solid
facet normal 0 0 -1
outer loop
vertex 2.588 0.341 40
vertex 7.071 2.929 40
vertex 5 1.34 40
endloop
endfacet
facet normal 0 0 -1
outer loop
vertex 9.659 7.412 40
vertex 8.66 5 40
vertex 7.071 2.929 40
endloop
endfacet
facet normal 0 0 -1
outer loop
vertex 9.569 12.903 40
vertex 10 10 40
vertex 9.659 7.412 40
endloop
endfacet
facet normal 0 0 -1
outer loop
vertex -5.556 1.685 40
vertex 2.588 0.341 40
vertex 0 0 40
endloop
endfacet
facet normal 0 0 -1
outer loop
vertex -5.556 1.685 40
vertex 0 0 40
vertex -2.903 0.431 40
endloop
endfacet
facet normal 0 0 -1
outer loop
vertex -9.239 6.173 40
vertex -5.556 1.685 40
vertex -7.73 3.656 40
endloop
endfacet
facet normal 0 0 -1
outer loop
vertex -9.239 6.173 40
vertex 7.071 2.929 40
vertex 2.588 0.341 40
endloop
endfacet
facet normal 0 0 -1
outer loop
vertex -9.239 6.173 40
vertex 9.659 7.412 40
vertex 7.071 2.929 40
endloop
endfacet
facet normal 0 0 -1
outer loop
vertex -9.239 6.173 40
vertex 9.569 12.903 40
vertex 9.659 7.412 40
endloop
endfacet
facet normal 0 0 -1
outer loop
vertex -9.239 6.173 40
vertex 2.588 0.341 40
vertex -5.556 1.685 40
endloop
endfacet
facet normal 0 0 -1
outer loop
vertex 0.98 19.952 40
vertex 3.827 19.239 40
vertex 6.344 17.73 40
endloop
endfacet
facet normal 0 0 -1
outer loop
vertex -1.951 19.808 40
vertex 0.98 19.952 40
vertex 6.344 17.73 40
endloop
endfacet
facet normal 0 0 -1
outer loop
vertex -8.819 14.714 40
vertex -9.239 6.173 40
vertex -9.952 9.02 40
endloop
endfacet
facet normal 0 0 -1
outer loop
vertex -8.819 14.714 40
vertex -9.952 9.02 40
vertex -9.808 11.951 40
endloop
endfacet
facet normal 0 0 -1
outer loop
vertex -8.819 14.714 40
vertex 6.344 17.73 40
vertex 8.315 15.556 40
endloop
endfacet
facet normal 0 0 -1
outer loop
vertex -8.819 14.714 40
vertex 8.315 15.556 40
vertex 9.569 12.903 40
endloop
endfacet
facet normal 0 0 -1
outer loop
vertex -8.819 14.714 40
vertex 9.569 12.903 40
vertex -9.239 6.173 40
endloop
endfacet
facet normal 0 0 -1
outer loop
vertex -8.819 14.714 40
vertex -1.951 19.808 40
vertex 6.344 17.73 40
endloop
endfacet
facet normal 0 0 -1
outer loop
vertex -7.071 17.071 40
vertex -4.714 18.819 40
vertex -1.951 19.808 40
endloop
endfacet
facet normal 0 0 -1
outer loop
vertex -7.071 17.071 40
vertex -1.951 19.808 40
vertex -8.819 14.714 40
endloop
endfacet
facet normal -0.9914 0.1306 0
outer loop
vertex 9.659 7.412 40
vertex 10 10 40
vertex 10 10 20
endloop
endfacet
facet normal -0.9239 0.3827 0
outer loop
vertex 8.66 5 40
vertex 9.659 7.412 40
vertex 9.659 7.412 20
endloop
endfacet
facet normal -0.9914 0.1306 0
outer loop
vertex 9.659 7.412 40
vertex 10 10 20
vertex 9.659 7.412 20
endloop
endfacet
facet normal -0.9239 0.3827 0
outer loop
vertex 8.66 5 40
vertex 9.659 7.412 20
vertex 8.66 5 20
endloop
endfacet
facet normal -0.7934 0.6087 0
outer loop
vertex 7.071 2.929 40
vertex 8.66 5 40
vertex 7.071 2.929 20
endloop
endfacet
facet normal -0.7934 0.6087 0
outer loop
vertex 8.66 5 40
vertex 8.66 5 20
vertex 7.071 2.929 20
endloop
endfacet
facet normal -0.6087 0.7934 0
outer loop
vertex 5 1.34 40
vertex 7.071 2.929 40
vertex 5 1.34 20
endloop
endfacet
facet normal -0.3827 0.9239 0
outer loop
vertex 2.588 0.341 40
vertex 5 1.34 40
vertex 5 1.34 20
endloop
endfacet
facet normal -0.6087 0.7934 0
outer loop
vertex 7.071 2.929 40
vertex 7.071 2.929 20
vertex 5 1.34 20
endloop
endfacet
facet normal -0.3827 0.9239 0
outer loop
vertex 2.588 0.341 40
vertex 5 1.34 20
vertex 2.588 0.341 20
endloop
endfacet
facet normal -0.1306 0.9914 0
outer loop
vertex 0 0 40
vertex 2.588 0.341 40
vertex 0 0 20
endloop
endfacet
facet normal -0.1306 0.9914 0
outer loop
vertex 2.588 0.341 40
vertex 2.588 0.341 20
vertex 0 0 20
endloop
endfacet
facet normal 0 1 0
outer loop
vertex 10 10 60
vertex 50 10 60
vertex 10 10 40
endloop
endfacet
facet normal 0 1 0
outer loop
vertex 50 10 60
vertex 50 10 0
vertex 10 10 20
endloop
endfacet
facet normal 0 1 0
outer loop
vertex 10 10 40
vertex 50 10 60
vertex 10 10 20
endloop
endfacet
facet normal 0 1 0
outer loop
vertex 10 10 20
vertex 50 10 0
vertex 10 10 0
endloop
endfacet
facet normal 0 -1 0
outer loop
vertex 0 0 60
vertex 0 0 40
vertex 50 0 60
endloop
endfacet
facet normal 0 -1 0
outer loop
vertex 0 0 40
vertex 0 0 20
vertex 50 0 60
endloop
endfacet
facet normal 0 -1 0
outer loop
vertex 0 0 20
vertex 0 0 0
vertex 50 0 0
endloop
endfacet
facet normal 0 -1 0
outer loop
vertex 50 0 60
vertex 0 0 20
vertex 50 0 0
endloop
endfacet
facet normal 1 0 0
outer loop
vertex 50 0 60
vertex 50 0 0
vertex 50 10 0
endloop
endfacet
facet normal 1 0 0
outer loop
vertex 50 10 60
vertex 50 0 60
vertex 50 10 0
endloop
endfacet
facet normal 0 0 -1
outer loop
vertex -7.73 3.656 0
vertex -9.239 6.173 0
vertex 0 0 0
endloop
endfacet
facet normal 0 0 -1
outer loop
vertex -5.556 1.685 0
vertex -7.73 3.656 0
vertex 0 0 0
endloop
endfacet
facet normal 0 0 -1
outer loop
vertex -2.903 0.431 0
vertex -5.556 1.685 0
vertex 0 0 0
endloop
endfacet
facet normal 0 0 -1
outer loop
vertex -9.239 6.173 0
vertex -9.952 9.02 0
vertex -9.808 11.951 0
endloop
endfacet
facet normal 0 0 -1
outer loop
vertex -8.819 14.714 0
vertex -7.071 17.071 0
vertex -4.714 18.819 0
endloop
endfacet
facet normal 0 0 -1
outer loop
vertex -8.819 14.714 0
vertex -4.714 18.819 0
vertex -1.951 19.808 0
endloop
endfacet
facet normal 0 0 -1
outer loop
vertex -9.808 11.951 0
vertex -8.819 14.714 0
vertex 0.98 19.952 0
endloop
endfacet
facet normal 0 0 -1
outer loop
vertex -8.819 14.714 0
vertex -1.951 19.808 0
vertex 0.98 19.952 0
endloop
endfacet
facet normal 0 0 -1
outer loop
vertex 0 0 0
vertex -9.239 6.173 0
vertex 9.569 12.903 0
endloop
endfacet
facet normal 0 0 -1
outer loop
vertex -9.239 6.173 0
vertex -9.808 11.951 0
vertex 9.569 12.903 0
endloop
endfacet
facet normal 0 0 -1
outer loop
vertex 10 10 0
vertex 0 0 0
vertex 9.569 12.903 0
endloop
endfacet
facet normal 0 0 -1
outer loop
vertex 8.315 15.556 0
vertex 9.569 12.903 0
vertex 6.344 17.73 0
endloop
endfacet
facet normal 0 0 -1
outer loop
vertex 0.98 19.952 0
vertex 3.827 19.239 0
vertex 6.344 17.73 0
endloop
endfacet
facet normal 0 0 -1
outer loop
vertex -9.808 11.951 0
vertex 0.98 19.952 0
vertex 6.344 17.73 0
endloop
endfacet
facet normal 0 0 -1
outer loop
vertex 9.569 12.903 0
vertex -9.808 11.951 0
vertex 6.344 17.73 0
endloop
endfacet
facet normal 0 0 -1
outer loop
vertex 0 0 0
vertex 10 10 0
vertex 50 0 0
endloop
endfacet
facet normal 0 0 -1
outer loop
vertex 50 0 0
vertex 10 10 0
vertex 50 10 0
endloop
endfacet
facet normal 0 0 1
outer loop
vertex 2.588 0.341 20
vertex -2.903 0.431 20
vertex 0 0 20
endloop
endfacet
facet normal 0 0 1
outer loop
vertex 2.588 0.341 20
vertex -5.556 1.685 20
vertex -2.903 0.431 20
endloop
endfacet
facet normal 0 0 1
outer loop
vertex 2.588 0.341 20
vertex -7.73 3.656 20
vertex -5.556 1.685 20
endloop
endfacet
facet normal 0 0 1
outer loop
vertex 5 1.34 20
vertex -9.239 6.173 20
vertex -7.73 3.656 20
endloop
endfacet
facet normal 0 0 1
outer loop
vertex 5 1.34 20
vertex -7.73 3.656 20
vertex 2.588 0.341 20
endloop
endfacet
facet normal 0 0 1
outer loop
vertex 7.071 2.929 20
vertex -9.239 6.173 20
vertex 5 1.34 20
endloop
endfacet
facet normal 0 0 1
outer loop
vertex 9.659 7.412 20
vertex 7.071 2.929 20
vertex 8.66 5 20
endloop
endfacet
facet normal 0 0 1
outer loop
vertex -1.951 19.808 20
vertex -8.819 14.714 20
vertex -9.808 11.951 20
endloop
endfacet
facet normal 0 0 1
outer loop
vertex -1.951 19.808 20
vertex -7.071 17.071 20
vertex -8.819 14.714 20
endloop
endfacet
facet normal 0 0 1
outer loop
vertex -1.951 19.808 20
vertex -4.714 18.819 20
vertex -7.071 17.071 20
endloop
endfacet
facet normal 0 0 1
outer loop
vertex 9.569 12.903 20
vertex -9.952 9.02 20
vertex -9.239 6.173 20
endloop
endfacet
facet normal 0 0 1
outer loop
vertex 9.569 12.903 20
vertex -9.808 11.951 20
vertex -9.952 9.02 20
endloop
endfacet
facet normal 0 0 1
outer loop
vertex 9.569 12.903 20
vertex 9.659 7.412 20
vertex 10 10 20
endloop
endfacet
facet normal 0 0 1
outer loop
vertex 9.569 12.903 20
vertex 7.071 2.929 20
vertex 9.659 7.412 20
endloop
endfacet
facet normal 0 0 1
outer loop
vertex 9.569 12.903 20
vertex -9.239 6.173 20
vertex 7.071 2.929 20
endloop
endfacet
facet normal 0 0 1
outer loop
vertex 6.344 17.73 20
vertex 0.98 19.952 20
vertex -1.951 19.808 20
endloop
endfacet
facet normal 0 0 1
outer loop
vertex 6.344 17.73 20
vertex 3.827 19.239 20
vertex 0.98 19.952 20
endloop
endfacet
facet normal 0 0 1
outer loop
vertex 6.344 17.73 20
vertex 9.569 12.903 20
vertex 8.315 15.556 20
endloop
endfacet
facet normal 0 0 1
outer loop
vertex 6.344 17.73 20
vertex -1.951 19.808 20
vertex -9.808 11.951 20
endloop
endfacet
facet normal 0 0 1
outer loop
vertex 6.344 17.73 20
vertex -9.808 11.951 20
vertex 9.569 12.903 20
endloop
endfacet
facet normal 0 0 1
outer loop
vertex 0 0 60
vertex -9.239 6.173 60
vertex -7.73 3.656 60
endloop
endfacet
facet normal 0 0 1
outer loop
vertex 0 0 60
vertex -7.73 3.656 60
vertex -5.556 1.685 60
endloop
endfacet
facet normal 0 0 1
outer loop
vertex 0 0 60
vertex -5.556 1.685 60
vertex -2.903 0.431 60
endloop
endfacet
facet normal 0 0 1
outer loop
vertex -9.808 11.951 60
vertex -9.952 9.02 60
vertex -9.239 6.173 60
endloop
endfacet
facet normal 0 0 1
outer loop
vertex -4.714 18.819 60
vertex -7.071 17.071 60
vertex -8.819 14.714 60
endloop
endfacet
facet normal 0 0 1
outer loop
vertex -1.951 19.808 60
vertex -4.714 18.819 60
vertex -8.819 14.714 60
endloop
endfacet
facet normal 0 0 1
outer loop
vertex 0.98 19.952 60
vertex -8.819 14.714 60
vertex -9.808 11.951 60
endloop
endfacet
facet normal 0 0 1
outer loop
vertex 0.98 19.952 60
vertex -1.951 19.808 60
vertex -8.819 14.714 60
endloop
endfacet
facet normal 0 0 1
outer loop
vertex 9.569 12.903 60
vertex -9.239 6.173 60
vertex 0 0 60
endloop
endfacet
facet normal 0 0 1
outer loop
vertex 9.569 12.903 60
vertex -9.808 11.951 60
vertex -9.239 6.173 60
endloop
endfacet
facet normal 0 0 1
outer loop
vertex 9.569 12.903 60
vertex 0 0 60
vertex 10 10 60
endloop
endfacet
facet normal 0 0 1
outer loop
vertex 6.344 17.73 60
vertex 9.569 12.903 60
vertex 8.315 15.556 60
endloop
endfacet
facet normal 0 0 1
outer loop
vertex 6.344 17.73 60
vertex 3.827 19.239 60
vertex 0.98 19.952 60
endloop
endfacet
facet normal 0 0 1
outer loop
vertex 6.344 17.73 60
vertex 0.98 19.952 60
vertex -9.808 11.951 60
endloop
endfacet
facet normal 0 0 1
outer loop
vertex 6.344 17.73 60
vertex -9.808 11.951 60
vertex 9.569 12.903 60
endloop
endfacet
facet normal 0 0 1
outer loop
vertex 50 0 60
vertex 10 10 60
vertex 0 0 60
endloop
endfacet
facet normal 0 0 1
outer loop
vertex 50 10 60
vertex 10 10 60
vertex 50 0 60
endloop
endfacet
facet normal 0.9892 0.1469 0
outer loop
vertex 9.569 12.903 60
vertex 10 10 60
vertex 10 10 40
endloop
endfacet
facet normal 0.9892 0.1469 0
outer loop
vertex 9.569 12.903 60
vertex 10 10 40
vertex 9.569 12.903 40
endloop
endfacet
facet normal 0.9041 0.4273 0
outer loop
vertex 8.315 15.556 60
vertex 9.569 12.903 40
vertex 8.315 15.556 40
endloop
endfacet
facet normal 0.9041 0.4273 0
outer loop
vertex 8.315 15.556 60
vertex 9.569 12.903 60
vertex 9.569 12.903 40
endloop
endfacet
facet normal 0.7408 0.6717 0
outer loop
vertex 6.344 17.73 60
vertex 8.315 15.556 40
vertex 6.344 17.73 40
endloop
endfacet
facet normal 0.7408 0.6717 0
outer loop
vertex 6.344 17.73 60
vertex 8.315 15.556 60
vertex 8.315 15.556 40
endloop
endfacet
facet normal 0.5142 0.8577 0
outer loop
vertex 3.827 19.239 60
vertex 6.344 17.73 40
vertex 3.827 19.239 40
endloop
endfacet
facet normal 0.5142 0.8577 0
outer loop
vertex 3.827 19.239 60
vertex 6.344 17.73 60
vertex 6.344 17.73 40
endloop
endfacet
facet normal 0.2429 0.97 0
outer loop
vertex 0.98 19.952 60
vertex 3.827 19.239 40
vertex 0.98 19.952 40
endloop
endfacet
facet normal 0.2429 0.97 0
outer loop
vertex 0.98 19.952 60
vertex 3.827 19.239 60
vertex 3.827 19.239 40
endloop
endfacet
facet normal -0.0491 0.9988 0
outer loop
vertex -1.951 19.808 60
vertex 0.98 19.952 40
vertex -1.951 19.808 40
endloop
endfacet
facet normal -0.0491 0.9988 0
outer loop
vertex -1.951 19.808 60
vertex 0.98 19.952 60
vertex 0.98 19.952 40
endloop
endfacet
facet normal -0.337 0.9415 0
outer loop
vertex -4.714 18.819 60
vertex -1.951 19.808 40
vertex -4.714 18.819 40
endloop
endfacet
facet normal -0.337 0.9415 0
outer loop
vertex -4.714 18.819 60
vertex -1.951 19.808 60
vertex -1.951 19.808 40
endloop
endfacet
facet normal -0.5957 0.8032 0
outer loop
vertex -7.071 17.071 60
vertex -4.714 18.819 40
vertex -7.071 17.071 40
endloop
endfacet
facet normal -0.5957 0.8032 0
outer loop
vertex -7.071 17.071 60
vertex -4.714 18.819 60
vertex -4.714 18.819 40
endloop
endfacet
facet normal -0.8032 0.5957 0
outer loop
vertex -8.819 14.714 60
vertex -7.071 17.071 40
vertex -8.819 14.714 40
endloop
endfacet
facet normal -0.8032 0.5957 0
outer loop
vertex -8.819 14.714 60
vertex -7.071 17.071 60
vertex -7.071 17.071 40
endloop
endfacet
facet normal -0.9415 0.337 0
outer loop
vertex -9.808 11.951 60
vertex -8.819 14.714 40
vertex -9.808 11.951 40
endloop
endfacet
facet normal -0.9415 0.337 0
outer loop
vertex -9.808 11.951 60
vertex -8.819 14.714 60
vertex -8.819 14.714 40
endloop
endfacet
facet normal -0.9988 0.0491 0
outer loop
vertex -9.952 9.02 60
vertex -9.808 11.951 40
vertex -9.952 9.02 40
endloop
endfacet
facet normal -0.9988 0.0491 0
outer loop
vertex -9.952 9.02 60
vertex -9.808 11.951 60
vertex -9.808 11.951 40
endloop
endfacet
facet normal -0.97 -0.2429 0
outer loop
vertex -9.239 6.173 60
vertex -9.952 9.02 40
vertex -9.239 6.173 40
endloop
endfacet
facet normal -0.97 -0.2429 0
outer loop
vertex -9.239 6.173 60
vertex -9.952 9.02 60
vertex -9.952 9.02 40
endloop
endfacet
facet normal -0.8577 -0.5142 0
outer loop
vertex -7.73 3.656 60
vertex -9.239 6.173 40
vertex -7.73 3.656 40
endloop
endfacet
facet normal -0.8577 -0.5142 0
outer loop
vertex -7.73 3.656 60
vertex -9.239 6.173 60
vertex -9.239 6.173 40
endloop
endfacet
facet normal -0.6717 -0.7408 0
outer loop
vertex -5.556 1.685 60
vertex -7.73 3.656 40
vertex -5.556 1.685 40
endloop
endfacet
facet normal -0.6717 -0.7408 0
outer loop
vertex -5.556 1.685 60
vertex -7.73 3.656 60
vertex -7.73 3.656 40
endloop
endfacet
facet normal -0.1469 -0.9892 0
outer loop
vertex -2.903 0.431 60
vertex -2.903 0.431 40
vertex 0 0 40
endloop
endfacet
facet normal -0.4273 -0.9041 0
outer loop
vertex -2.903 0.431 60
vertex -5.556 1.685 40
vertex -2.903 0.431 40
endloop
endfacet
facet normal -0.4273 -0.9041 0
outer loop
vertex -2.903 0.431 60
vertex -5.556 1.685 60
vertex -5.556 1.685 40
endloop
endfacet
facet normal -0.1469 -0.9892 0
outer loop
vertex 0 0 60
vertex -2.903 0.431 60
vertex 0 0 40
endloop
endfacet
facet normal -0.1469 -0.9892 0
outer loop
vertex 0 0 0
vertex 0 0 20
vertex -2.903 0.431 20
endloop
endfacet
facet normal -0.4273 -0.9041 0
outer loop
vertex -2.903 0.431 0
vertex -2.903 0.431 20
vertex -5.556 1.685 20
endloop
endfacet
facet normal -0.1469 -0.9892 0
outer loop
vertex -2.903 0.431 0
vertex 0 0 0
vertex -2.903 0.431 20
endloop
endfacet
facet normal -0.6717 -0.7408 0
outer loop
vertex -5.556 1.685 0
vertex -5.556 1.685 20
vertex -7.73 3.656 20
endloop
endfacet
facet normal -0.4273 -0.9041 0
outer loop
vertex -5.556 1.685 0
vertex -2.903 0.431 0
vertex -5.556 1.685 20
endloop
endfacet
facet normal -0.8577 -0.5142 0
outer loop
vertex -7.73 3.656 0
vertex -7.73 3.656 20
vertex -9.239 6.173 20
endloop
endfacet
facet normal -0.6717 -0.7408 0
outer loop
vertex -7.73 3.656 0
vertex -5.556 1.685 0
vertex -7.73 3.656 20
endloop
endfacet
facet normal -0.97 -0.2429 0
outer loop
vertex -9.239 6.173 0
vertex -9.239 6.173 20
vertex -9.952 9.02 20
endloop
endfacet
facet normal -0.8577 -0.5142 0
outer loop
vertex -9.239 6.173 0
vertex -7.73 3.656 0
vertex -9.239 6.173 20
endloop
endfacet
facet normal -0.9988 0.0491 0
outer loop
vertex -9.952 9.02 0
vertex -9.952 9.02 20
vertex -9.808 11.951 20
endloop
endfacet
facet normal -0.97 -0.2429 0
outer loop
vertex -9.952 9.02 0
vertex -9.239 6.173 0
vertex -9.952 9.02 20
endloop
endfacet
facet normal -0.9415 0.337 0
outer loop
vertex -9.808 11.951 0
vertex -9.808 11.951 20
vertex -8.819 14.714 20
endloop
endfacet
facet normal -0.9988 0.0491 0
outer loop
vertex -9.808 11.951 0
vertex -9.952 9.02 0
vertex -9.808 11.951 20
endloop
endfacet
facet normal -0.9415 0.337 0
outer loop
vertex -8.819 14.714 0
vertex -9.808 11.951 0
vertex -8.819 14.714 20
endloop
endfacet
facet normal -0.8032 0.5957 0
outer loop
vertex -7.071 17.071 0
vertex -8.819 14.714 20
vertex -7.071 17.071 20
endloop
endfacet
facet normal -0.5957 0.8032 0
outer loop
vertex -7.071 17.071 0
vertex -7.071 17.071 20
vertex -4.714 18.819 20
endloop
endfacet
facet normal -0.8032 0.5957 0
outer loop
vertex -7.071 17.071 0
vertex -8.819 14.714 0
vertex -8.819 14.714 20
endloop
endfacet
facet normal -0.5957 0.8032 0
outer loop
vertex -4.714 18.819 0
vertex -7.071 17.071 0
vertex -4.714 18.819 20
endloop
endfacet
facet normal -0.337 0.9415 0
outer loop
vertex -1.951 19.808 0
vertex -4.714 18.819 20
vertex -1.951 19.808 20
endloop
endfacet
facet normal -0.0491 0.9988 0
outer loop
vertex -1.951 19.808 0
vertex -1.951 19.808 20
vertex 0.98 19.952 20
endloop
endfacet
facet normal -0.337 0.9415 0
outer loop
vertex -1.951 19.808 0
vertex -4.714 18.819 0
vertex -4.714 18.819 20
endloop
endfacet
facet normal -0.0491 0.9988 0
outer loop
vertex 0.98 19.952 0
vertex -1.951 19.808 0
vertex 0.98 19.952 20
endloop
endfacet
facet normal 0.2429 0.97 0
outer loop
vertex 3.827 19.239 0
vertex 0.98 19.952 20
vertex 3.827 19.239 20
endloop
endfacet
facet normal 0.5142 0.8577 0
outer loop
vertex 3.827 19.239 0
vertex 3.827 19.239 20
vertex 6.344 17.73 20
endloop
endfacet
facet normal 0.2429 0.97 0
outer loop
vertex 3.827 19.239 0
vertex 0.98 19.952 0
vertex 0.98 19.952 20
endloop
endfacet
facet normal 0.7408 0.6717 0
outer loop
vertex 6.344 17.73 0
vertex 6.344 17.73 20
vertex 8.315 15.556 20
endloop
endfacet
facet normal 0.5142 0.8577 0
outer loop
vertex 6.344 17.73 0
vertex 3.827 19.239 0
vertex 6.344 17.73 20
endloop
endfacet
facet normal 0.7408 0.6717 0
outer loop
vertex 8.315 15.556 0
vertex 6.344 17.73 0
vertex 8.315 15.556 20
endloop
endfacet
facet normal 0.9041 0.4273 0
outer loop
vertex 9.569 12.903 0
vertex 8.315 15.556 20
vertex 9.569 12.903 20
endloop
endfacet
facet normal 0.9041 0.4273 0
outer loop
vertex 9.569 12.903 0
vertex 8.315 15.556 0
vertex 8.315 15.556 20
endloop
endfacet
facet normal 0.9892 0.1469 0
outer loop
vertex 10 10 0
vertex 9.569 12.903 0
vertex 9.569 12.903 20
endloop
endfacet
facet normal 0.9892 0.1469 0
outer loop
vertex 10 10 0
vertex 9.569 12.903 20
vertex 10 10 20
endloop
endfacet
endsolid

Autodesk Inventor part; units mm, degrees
ref_plane "YZ Plane" through (0, 0, 0) normal (1, 0, 0) x (0, 1, 0)
ref_plane "XZ Plane" through (0, 0, 0) normal (0, 1, 0) x (-1, 0, 0)
sketch "Sketch1" plane through (0, 0, 0) normal (0, 0, 1) x (1, 0, 0)
  line L0 (0, 0) -> (50, 0)
  line L1 (50, 0) -> (50, 10)
  line L2 (50, 10) -> (0, 10)
  line L3 (0, 10) -> (0, 0)
  circle A0 centre (0, 10) radius 10
  point P0 (10, 10)
  dimension "d0" = 50
  dimension "d1" = 10
  dimension "d2" = 20
  dimension "d3" = 0
extrude "Extrusion1" add sketch "Sketch1" along normal blind 60 contours A0 L2 L1 L0
extrude "Extrusion2" add sketch "Sketch1" along normal blind 20 contours A0 L2 L3 | L3 L2 A0
ref_plane "Work Plane1" through (0, 0, 30) normal (0, 0, 1) x (1, 0, 0)
mirror "Mirror1" about plane through (0, 0, 30) normal (0, 0, 1) of "Extrusion2"
properties part number "left_hinge"
